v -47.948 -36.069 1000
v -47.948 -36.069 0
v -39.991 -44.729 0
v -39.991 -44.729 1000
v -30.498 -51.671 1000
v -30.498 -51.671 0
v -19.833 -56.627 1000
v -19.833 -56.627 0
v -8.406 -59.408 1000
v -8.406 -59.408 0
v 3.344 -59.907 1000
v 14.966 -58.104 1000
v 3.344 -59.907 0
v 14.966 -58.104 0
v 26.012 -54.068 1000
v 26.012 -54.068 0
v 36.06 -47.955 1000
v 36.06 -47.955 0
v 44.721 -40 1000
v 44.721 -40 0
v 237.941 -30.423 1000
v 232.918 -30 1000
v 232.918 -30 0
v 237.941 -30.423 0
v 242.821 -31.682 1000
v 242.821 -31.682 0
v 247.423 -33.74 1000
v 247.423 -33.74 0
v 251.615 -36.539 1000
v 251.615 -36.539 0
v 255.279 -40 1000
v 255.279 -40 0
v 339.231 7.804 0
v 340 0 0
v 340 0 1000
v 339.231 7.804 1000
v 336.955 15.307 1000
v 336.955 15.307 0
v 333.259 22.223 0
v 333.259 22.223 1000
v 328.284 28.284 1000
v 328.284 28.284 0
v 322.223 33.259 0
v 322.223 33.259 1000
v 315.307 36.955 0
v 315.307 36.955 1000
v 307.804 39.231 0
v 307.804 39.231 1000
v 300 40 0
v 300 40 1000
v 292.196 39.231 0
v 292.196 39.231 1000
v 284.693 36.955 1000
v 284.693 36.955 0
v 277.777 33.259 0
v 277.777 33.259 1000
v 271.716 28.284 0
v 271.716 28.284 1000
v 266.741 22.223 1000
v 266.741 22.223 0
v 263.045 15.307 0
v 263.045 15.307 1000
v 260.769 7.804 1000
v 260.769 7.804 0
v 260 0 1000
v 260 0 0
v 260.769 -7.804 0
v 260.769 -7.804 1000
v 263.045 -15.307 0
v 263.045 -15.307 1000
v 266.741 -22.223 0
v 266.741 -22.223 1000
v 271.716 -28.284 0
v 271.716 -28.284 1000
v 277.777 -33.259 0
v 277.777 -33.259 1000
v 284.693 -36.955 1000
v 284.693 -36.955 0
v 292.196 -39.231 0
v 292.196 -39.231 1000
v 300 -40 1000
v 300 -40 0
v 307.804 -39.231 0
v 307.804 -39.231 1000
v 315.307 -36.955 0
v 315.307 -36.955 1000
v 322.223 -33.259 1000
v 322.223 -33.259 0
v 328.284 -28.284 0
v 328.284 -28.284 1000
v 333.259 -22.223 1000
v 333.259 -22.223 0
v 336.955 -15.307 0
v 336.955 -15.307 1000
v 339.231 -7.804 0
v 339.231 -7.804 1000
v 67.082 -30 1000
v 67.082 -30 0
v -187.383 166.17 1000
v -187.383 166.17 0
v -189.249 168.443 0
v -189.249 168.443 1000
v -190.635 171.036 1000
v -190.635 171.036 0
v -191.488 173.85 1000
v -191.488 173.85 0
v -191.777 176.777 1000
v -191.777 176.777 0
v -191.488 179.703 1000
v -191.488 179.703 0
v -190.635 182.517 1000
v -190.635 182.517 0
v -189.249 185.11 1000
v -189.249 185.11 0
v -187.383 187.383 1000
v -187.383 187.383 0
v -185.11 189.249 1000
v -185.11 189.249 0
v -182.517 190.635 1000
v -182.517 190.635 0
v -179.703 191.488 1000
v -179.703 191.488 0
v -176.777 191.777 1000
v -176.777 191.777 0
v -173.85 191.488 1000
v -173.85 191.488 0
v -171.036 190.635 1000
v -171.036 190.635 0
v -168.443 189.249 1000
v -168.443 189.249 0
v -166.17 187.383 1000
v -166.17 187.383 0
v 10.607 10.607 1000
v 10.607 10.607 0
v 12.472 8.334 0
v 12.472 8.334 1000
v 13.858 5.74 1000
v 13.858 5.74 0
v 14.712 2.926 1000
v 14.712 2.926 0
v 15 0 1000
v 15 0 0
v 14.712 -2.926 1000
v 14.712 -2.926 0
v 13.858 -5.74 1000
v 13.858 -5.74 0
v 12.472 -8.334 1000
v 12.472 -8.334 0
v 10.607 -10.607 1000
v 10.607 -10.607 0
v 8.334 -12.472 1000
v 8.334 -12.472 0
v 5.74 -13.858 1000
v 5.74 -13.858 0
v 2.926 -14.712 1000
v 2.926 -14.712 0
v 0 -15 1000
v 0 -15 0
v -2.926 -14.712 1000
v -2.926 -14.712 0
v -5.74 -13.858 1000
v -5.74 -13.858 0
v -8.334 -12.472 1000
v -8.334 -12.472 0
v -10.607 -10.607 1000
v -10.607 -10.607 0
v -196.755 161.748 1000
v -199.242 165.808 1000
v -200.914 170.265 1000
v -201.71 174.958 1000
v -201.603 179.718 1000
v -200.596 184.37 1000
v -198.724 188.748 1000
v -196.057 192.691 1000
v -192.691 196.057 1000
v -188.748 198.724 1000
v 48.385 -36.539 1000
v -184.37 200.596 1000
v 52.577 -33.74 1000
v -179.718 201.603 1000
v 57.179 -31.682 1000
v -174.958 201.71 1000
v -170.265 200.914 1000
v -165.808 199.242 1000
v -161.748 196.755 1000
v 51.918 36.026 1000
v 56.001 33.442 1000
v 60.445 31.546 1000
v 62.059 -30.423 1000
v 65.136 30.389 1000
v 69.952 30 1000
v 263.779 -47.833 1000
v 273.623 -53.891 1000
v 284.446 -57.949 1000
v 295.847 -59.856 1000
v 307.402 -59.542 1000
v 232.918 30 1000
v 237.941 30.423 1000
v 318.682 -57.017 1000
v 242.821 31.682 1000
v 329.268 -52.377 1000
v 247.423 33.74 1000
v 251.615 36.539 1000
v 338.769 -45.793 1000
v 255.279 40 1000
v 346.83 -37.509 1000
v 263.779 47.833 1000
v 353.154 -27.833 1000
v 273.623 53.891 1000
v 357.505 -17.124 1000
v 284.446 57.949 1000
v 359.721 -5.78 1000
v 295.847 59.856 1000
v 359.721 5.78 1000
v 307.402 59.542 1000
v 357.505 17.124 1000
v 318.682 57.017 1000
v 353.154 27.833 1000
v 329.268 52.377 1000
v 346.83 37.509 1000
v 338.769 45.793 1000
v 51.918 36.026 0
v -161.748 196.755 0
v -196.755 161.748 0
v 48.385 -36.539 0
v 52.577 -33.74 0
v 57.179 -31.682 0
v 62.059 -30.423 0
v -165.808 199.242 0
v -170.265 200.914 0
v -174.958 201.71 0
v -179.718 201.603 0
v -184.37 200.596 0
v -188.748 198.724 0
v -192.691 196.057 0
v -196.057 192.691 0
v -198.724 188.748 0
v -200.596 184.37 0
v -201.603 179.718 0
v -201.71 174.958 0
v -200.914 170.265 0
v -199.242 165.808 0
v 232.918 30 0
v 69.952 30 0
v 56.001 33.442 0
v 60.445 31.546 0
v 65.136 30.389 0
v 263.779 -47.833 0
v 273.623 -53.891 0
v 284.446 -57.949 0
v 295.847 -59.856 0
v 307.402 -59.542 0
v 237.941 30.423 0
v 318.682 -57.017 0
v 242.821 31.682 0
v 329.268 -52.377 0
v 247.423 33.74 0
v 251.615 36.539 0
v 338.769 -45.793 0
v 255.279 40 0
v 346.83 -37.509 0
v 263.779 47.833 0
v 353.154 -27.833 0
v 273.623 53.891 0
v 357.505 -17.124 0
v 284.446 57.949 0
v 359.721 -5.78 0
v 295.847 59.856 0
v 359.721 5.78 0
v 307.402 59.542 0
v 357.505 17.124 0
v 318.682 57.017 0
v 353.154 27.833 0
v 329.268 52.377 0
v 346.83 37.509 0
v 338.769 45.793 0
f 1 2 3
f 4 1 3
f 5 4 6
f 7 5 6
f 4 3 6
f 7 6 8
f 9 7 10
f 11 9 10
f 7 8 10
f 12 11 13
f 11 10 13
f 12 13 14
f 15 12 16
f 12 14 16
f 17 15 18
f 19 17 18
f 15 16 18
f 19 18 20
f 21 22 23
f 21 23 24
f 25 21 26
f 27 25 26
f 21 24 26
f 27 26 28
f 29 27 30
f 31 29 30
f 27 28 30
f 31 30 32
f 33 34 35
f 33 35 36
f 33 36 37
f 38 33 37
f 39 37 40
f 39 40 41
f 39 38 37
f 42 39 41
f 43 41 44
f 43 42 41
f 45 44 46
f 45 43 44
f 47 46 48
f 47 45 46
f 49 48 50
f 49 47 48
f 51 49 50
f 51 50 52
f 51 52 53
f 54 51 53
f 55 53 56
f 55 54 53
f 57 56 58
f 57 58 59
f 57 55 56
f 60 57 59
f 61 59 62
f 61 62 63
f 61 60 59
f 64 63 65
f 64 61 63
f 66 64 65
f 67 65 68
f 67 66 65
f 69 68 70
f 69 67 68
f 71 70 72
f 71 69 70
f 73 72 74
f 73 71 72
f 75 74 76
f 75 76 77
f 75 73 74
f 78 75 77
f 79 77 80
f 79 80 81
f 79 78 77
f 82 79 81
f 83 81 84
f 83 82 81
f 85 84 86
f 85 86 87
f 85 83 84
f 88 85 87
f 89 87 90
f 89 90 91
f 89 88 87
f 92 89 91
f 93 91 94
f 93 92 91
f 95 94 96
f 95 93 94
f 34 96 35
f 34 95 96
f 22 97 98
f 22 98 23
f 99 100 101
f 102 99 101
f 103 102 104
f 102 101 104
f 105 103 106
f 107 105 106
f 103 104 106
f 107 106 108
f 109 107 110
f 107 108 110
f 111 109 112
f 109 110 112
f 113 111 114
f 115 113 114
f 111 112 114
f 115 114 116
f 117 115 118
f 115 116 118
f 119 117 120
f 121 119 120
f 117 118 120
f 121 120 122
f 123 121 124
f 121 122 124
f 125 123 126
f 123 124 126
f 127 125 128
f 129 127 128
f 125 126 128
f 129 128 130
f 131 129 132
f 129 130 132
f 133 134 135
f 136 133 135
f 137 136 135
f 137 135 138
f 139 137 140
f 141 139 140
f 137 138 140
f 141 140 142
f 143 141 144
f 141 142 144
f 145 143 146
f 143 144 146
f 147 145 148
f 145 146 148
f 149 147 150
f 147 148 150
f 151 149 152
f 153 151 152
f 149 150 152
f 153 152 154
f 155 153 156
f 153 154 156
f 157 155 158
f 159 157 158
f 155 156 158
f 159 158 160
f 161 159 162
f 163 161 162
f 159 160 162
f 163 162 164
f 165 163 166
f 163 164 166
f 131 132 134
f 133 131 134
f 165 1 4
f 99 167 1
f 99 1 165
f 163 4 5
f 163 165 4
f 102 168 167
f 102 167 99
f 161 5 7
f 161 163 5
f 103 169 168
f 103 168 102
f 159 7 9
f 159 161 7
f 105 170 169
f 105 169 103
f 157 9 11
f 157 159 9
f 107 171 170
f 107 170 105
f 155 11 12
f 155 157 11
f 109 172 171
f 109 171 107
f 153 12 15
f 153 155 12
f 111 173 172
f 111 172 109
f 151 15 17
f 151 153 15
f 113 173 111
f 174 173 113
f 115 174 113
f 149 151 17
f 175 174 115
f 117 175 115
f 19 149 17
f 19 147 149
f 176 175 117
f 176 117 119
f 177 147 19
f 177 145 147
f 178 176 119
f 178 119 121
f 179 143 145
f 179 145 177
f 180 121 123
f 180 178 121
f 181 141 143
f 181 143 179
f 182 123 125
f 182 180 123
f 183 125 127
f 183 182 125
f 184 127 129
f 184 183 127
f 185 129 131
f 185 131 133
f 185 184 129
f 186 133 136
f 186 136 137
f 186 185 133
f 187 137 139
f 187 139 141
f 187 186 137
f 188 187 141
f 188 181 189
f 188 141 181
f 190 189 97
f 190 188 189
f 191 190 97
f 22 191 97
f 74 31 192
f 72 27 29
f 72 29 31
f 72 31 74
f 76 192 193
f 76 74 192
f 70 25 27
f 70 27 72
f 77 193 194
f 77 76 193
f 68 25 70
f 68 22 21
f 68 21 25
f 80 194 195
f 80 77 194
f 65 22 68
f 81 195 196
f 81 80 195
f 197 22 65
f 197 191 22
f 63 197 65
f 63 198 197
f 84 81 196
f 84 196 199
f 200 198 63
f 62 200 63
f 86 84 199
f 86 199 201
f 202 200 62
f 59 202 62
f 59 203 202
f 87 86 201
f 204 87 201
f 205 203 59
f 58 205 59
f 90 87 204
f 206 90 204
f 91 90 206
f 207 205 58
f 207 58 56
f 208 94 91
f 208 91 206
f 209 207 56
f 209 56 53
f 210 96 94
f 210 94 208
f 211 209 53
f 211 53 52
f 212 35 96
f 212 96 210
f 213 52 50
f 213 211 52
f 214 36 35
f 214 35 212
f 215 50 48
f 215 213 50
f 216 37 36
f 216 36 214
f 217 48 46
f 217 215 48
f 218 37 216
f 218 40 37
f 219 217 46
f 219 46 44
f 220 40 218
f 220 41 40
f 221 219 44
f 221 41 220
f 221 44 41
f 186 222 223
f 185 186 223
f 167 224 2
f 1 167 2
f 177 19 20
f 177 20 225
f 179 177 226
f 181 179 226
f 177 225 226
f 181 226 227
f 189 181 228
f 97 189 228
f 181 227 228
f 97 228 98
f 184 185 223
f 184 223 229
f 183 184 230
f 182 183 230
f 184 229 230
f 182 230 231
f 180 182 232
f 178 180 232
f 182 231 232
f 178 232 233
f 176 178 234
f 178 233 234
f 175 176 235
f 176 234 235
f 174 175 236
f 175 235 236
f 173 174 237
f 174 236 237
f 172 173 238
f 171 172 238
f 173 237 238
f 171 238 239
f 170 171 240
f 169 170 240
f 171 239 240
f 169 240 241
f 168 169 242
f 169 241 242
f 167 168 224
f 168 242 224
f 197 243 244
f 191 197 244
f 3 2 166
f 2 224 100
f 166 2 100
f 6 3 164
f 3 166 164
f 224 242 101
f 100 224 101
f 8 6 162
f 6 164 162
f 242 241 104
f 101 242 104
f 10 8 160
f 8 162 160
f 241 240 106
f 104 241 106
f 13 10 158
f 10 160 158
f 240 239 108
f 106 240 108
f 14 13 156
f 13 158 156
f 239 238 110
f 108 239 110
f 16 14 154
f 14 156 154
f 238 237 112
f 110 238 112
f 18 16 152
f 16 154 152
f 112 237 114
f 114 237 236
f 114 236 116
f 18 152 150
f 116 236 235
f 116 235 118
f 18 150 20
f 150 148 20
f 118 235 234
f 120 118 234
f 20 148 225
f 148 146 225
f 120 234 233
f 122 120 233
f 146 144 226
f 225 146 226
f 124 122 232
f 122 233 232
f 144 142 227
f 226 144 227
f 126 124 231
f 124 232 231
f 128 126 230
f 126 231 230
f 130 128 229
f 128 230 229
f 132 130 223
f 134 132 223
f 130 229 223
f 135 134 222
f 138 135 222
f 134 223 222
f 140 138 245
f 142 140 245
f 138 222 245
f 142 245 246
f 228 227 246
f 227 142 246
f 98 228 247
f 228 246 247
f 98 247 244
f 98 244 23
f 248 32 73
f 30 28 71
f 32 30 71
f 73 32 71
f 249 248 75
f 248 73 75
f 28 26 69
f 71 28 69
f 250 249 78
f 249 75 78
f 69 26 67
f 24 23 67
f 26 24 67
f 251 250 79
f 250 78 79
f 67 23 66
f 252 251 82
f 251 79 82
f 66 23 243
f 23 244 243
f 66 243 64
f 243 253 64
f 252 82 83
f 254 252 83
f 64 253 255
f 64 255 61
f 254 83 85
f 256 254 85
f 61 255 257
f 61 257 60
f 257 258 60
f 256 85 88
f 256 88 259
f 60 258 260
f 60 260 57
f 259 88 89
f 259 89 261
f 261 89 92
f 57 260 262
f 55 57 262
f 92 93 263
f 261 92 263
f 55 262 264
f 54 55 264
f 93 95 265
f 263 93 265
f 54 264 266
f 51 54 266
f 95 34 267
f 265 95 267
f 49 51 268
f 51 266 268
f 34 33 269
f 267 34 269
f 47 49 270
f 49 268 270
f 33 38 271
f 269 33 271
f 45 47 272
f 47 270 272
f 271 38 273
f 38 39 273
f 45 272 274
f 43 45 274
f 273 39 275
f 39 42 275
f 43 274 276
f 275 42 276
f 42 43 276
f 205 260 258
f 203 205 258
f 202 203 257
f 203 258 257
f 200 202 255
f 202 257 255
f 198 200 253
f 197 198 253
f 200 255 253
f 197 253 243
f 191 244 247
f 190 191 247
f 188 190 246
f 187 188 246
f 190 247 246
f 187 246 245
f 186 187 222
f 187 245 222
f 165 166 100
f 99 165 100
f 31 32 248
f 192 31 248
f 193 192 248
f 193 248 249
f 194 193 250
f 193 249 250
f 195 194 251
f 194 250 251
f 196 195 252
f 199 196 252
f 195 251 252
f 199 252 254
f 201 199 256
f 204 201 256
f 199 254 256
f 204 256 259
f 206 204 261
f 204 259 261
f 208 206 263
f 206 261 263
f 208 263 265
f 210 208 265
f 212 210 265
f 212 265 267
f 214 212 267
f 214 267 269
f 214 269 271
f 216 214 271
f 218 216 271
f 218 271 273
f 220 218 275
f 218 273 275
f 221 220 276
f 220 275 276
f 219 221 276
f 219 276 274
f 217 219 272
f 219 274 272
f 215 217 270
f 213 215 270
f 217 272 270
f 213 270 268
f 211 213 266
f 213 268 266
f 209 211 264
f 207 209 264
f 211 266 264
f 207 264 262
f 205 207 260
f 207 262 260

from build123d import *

# Parameters (mm, degrees)
SKETCH13_R          = 40
BOSS_EXTRUDE1_DEPTH = 1000


with BuildPart() as part:
    # Sketch13 → Boss-Extrude1 (new body)
    with BuildSketch(Plane.XY):
        with BuildLine():
            Line((51.91795422, 36.025866242), (-161.747997967, 196.755140095))
            ThreePointArc((-161.747997967, 196.755140095), (-194.454364826, 194.454364826), (-196.755140095, 161.747997967))
            Line((-196.755140095, 161.747997967), (-47.948267516, -36.068873592))
            ThreePointArc((-47.948267516, -36.068873592), (-2.54296529, -59.946086841), (44.72135955, -40))
            ThreePointArc((44.72135955, -40), (54.834590611, -32.613872125), (67.082039325, -30))
            Line((67.082039325, -30), (232.917960675, -30))
            ThreePointArc((232.917960675, -30), (245.165409389, -32.613872125), (255.27864045, -40))
            ThreePointArc((255.27864045, -40), (360, 0), (255.27864045, 40))
            ThreePointArc((255.27864045, 40), (245.165409389, 32.613872125), (232.917960675, 30))
            Line((232.917960675, 30), (69.952391016, 30))
            ThreePointArc((69.952391016, 30), (60.445130968, 31.546318228), (51.91795422, 36.025866242))
        make_face()
        with Locations((300, 0)):
            Circle(SKETCH13_R, mode=Mode.SUBTRACT)
        with BuildLine():
            Line((-10.606601718, -10.606601718), (-187.383297014, 166.170093579))
            ThreePointArc((-187.383297014, 166.170093579), (-187.383297014, 187.383297014), (-166.170093579, 187.383297014))
            Line((-166.170093579, 187.383297014), (10.606601718, 10.606601718))
            ThreePointArc((10.606601718, 10.606601718), (10.606601718, -10.606601718), (-10.606601718, -10.606601718))
        make_face(mode=Mode.SUBTRACT)
    extrude(amount=BOSS_EXTRUDE1_DEPTH)


solid = part.part
